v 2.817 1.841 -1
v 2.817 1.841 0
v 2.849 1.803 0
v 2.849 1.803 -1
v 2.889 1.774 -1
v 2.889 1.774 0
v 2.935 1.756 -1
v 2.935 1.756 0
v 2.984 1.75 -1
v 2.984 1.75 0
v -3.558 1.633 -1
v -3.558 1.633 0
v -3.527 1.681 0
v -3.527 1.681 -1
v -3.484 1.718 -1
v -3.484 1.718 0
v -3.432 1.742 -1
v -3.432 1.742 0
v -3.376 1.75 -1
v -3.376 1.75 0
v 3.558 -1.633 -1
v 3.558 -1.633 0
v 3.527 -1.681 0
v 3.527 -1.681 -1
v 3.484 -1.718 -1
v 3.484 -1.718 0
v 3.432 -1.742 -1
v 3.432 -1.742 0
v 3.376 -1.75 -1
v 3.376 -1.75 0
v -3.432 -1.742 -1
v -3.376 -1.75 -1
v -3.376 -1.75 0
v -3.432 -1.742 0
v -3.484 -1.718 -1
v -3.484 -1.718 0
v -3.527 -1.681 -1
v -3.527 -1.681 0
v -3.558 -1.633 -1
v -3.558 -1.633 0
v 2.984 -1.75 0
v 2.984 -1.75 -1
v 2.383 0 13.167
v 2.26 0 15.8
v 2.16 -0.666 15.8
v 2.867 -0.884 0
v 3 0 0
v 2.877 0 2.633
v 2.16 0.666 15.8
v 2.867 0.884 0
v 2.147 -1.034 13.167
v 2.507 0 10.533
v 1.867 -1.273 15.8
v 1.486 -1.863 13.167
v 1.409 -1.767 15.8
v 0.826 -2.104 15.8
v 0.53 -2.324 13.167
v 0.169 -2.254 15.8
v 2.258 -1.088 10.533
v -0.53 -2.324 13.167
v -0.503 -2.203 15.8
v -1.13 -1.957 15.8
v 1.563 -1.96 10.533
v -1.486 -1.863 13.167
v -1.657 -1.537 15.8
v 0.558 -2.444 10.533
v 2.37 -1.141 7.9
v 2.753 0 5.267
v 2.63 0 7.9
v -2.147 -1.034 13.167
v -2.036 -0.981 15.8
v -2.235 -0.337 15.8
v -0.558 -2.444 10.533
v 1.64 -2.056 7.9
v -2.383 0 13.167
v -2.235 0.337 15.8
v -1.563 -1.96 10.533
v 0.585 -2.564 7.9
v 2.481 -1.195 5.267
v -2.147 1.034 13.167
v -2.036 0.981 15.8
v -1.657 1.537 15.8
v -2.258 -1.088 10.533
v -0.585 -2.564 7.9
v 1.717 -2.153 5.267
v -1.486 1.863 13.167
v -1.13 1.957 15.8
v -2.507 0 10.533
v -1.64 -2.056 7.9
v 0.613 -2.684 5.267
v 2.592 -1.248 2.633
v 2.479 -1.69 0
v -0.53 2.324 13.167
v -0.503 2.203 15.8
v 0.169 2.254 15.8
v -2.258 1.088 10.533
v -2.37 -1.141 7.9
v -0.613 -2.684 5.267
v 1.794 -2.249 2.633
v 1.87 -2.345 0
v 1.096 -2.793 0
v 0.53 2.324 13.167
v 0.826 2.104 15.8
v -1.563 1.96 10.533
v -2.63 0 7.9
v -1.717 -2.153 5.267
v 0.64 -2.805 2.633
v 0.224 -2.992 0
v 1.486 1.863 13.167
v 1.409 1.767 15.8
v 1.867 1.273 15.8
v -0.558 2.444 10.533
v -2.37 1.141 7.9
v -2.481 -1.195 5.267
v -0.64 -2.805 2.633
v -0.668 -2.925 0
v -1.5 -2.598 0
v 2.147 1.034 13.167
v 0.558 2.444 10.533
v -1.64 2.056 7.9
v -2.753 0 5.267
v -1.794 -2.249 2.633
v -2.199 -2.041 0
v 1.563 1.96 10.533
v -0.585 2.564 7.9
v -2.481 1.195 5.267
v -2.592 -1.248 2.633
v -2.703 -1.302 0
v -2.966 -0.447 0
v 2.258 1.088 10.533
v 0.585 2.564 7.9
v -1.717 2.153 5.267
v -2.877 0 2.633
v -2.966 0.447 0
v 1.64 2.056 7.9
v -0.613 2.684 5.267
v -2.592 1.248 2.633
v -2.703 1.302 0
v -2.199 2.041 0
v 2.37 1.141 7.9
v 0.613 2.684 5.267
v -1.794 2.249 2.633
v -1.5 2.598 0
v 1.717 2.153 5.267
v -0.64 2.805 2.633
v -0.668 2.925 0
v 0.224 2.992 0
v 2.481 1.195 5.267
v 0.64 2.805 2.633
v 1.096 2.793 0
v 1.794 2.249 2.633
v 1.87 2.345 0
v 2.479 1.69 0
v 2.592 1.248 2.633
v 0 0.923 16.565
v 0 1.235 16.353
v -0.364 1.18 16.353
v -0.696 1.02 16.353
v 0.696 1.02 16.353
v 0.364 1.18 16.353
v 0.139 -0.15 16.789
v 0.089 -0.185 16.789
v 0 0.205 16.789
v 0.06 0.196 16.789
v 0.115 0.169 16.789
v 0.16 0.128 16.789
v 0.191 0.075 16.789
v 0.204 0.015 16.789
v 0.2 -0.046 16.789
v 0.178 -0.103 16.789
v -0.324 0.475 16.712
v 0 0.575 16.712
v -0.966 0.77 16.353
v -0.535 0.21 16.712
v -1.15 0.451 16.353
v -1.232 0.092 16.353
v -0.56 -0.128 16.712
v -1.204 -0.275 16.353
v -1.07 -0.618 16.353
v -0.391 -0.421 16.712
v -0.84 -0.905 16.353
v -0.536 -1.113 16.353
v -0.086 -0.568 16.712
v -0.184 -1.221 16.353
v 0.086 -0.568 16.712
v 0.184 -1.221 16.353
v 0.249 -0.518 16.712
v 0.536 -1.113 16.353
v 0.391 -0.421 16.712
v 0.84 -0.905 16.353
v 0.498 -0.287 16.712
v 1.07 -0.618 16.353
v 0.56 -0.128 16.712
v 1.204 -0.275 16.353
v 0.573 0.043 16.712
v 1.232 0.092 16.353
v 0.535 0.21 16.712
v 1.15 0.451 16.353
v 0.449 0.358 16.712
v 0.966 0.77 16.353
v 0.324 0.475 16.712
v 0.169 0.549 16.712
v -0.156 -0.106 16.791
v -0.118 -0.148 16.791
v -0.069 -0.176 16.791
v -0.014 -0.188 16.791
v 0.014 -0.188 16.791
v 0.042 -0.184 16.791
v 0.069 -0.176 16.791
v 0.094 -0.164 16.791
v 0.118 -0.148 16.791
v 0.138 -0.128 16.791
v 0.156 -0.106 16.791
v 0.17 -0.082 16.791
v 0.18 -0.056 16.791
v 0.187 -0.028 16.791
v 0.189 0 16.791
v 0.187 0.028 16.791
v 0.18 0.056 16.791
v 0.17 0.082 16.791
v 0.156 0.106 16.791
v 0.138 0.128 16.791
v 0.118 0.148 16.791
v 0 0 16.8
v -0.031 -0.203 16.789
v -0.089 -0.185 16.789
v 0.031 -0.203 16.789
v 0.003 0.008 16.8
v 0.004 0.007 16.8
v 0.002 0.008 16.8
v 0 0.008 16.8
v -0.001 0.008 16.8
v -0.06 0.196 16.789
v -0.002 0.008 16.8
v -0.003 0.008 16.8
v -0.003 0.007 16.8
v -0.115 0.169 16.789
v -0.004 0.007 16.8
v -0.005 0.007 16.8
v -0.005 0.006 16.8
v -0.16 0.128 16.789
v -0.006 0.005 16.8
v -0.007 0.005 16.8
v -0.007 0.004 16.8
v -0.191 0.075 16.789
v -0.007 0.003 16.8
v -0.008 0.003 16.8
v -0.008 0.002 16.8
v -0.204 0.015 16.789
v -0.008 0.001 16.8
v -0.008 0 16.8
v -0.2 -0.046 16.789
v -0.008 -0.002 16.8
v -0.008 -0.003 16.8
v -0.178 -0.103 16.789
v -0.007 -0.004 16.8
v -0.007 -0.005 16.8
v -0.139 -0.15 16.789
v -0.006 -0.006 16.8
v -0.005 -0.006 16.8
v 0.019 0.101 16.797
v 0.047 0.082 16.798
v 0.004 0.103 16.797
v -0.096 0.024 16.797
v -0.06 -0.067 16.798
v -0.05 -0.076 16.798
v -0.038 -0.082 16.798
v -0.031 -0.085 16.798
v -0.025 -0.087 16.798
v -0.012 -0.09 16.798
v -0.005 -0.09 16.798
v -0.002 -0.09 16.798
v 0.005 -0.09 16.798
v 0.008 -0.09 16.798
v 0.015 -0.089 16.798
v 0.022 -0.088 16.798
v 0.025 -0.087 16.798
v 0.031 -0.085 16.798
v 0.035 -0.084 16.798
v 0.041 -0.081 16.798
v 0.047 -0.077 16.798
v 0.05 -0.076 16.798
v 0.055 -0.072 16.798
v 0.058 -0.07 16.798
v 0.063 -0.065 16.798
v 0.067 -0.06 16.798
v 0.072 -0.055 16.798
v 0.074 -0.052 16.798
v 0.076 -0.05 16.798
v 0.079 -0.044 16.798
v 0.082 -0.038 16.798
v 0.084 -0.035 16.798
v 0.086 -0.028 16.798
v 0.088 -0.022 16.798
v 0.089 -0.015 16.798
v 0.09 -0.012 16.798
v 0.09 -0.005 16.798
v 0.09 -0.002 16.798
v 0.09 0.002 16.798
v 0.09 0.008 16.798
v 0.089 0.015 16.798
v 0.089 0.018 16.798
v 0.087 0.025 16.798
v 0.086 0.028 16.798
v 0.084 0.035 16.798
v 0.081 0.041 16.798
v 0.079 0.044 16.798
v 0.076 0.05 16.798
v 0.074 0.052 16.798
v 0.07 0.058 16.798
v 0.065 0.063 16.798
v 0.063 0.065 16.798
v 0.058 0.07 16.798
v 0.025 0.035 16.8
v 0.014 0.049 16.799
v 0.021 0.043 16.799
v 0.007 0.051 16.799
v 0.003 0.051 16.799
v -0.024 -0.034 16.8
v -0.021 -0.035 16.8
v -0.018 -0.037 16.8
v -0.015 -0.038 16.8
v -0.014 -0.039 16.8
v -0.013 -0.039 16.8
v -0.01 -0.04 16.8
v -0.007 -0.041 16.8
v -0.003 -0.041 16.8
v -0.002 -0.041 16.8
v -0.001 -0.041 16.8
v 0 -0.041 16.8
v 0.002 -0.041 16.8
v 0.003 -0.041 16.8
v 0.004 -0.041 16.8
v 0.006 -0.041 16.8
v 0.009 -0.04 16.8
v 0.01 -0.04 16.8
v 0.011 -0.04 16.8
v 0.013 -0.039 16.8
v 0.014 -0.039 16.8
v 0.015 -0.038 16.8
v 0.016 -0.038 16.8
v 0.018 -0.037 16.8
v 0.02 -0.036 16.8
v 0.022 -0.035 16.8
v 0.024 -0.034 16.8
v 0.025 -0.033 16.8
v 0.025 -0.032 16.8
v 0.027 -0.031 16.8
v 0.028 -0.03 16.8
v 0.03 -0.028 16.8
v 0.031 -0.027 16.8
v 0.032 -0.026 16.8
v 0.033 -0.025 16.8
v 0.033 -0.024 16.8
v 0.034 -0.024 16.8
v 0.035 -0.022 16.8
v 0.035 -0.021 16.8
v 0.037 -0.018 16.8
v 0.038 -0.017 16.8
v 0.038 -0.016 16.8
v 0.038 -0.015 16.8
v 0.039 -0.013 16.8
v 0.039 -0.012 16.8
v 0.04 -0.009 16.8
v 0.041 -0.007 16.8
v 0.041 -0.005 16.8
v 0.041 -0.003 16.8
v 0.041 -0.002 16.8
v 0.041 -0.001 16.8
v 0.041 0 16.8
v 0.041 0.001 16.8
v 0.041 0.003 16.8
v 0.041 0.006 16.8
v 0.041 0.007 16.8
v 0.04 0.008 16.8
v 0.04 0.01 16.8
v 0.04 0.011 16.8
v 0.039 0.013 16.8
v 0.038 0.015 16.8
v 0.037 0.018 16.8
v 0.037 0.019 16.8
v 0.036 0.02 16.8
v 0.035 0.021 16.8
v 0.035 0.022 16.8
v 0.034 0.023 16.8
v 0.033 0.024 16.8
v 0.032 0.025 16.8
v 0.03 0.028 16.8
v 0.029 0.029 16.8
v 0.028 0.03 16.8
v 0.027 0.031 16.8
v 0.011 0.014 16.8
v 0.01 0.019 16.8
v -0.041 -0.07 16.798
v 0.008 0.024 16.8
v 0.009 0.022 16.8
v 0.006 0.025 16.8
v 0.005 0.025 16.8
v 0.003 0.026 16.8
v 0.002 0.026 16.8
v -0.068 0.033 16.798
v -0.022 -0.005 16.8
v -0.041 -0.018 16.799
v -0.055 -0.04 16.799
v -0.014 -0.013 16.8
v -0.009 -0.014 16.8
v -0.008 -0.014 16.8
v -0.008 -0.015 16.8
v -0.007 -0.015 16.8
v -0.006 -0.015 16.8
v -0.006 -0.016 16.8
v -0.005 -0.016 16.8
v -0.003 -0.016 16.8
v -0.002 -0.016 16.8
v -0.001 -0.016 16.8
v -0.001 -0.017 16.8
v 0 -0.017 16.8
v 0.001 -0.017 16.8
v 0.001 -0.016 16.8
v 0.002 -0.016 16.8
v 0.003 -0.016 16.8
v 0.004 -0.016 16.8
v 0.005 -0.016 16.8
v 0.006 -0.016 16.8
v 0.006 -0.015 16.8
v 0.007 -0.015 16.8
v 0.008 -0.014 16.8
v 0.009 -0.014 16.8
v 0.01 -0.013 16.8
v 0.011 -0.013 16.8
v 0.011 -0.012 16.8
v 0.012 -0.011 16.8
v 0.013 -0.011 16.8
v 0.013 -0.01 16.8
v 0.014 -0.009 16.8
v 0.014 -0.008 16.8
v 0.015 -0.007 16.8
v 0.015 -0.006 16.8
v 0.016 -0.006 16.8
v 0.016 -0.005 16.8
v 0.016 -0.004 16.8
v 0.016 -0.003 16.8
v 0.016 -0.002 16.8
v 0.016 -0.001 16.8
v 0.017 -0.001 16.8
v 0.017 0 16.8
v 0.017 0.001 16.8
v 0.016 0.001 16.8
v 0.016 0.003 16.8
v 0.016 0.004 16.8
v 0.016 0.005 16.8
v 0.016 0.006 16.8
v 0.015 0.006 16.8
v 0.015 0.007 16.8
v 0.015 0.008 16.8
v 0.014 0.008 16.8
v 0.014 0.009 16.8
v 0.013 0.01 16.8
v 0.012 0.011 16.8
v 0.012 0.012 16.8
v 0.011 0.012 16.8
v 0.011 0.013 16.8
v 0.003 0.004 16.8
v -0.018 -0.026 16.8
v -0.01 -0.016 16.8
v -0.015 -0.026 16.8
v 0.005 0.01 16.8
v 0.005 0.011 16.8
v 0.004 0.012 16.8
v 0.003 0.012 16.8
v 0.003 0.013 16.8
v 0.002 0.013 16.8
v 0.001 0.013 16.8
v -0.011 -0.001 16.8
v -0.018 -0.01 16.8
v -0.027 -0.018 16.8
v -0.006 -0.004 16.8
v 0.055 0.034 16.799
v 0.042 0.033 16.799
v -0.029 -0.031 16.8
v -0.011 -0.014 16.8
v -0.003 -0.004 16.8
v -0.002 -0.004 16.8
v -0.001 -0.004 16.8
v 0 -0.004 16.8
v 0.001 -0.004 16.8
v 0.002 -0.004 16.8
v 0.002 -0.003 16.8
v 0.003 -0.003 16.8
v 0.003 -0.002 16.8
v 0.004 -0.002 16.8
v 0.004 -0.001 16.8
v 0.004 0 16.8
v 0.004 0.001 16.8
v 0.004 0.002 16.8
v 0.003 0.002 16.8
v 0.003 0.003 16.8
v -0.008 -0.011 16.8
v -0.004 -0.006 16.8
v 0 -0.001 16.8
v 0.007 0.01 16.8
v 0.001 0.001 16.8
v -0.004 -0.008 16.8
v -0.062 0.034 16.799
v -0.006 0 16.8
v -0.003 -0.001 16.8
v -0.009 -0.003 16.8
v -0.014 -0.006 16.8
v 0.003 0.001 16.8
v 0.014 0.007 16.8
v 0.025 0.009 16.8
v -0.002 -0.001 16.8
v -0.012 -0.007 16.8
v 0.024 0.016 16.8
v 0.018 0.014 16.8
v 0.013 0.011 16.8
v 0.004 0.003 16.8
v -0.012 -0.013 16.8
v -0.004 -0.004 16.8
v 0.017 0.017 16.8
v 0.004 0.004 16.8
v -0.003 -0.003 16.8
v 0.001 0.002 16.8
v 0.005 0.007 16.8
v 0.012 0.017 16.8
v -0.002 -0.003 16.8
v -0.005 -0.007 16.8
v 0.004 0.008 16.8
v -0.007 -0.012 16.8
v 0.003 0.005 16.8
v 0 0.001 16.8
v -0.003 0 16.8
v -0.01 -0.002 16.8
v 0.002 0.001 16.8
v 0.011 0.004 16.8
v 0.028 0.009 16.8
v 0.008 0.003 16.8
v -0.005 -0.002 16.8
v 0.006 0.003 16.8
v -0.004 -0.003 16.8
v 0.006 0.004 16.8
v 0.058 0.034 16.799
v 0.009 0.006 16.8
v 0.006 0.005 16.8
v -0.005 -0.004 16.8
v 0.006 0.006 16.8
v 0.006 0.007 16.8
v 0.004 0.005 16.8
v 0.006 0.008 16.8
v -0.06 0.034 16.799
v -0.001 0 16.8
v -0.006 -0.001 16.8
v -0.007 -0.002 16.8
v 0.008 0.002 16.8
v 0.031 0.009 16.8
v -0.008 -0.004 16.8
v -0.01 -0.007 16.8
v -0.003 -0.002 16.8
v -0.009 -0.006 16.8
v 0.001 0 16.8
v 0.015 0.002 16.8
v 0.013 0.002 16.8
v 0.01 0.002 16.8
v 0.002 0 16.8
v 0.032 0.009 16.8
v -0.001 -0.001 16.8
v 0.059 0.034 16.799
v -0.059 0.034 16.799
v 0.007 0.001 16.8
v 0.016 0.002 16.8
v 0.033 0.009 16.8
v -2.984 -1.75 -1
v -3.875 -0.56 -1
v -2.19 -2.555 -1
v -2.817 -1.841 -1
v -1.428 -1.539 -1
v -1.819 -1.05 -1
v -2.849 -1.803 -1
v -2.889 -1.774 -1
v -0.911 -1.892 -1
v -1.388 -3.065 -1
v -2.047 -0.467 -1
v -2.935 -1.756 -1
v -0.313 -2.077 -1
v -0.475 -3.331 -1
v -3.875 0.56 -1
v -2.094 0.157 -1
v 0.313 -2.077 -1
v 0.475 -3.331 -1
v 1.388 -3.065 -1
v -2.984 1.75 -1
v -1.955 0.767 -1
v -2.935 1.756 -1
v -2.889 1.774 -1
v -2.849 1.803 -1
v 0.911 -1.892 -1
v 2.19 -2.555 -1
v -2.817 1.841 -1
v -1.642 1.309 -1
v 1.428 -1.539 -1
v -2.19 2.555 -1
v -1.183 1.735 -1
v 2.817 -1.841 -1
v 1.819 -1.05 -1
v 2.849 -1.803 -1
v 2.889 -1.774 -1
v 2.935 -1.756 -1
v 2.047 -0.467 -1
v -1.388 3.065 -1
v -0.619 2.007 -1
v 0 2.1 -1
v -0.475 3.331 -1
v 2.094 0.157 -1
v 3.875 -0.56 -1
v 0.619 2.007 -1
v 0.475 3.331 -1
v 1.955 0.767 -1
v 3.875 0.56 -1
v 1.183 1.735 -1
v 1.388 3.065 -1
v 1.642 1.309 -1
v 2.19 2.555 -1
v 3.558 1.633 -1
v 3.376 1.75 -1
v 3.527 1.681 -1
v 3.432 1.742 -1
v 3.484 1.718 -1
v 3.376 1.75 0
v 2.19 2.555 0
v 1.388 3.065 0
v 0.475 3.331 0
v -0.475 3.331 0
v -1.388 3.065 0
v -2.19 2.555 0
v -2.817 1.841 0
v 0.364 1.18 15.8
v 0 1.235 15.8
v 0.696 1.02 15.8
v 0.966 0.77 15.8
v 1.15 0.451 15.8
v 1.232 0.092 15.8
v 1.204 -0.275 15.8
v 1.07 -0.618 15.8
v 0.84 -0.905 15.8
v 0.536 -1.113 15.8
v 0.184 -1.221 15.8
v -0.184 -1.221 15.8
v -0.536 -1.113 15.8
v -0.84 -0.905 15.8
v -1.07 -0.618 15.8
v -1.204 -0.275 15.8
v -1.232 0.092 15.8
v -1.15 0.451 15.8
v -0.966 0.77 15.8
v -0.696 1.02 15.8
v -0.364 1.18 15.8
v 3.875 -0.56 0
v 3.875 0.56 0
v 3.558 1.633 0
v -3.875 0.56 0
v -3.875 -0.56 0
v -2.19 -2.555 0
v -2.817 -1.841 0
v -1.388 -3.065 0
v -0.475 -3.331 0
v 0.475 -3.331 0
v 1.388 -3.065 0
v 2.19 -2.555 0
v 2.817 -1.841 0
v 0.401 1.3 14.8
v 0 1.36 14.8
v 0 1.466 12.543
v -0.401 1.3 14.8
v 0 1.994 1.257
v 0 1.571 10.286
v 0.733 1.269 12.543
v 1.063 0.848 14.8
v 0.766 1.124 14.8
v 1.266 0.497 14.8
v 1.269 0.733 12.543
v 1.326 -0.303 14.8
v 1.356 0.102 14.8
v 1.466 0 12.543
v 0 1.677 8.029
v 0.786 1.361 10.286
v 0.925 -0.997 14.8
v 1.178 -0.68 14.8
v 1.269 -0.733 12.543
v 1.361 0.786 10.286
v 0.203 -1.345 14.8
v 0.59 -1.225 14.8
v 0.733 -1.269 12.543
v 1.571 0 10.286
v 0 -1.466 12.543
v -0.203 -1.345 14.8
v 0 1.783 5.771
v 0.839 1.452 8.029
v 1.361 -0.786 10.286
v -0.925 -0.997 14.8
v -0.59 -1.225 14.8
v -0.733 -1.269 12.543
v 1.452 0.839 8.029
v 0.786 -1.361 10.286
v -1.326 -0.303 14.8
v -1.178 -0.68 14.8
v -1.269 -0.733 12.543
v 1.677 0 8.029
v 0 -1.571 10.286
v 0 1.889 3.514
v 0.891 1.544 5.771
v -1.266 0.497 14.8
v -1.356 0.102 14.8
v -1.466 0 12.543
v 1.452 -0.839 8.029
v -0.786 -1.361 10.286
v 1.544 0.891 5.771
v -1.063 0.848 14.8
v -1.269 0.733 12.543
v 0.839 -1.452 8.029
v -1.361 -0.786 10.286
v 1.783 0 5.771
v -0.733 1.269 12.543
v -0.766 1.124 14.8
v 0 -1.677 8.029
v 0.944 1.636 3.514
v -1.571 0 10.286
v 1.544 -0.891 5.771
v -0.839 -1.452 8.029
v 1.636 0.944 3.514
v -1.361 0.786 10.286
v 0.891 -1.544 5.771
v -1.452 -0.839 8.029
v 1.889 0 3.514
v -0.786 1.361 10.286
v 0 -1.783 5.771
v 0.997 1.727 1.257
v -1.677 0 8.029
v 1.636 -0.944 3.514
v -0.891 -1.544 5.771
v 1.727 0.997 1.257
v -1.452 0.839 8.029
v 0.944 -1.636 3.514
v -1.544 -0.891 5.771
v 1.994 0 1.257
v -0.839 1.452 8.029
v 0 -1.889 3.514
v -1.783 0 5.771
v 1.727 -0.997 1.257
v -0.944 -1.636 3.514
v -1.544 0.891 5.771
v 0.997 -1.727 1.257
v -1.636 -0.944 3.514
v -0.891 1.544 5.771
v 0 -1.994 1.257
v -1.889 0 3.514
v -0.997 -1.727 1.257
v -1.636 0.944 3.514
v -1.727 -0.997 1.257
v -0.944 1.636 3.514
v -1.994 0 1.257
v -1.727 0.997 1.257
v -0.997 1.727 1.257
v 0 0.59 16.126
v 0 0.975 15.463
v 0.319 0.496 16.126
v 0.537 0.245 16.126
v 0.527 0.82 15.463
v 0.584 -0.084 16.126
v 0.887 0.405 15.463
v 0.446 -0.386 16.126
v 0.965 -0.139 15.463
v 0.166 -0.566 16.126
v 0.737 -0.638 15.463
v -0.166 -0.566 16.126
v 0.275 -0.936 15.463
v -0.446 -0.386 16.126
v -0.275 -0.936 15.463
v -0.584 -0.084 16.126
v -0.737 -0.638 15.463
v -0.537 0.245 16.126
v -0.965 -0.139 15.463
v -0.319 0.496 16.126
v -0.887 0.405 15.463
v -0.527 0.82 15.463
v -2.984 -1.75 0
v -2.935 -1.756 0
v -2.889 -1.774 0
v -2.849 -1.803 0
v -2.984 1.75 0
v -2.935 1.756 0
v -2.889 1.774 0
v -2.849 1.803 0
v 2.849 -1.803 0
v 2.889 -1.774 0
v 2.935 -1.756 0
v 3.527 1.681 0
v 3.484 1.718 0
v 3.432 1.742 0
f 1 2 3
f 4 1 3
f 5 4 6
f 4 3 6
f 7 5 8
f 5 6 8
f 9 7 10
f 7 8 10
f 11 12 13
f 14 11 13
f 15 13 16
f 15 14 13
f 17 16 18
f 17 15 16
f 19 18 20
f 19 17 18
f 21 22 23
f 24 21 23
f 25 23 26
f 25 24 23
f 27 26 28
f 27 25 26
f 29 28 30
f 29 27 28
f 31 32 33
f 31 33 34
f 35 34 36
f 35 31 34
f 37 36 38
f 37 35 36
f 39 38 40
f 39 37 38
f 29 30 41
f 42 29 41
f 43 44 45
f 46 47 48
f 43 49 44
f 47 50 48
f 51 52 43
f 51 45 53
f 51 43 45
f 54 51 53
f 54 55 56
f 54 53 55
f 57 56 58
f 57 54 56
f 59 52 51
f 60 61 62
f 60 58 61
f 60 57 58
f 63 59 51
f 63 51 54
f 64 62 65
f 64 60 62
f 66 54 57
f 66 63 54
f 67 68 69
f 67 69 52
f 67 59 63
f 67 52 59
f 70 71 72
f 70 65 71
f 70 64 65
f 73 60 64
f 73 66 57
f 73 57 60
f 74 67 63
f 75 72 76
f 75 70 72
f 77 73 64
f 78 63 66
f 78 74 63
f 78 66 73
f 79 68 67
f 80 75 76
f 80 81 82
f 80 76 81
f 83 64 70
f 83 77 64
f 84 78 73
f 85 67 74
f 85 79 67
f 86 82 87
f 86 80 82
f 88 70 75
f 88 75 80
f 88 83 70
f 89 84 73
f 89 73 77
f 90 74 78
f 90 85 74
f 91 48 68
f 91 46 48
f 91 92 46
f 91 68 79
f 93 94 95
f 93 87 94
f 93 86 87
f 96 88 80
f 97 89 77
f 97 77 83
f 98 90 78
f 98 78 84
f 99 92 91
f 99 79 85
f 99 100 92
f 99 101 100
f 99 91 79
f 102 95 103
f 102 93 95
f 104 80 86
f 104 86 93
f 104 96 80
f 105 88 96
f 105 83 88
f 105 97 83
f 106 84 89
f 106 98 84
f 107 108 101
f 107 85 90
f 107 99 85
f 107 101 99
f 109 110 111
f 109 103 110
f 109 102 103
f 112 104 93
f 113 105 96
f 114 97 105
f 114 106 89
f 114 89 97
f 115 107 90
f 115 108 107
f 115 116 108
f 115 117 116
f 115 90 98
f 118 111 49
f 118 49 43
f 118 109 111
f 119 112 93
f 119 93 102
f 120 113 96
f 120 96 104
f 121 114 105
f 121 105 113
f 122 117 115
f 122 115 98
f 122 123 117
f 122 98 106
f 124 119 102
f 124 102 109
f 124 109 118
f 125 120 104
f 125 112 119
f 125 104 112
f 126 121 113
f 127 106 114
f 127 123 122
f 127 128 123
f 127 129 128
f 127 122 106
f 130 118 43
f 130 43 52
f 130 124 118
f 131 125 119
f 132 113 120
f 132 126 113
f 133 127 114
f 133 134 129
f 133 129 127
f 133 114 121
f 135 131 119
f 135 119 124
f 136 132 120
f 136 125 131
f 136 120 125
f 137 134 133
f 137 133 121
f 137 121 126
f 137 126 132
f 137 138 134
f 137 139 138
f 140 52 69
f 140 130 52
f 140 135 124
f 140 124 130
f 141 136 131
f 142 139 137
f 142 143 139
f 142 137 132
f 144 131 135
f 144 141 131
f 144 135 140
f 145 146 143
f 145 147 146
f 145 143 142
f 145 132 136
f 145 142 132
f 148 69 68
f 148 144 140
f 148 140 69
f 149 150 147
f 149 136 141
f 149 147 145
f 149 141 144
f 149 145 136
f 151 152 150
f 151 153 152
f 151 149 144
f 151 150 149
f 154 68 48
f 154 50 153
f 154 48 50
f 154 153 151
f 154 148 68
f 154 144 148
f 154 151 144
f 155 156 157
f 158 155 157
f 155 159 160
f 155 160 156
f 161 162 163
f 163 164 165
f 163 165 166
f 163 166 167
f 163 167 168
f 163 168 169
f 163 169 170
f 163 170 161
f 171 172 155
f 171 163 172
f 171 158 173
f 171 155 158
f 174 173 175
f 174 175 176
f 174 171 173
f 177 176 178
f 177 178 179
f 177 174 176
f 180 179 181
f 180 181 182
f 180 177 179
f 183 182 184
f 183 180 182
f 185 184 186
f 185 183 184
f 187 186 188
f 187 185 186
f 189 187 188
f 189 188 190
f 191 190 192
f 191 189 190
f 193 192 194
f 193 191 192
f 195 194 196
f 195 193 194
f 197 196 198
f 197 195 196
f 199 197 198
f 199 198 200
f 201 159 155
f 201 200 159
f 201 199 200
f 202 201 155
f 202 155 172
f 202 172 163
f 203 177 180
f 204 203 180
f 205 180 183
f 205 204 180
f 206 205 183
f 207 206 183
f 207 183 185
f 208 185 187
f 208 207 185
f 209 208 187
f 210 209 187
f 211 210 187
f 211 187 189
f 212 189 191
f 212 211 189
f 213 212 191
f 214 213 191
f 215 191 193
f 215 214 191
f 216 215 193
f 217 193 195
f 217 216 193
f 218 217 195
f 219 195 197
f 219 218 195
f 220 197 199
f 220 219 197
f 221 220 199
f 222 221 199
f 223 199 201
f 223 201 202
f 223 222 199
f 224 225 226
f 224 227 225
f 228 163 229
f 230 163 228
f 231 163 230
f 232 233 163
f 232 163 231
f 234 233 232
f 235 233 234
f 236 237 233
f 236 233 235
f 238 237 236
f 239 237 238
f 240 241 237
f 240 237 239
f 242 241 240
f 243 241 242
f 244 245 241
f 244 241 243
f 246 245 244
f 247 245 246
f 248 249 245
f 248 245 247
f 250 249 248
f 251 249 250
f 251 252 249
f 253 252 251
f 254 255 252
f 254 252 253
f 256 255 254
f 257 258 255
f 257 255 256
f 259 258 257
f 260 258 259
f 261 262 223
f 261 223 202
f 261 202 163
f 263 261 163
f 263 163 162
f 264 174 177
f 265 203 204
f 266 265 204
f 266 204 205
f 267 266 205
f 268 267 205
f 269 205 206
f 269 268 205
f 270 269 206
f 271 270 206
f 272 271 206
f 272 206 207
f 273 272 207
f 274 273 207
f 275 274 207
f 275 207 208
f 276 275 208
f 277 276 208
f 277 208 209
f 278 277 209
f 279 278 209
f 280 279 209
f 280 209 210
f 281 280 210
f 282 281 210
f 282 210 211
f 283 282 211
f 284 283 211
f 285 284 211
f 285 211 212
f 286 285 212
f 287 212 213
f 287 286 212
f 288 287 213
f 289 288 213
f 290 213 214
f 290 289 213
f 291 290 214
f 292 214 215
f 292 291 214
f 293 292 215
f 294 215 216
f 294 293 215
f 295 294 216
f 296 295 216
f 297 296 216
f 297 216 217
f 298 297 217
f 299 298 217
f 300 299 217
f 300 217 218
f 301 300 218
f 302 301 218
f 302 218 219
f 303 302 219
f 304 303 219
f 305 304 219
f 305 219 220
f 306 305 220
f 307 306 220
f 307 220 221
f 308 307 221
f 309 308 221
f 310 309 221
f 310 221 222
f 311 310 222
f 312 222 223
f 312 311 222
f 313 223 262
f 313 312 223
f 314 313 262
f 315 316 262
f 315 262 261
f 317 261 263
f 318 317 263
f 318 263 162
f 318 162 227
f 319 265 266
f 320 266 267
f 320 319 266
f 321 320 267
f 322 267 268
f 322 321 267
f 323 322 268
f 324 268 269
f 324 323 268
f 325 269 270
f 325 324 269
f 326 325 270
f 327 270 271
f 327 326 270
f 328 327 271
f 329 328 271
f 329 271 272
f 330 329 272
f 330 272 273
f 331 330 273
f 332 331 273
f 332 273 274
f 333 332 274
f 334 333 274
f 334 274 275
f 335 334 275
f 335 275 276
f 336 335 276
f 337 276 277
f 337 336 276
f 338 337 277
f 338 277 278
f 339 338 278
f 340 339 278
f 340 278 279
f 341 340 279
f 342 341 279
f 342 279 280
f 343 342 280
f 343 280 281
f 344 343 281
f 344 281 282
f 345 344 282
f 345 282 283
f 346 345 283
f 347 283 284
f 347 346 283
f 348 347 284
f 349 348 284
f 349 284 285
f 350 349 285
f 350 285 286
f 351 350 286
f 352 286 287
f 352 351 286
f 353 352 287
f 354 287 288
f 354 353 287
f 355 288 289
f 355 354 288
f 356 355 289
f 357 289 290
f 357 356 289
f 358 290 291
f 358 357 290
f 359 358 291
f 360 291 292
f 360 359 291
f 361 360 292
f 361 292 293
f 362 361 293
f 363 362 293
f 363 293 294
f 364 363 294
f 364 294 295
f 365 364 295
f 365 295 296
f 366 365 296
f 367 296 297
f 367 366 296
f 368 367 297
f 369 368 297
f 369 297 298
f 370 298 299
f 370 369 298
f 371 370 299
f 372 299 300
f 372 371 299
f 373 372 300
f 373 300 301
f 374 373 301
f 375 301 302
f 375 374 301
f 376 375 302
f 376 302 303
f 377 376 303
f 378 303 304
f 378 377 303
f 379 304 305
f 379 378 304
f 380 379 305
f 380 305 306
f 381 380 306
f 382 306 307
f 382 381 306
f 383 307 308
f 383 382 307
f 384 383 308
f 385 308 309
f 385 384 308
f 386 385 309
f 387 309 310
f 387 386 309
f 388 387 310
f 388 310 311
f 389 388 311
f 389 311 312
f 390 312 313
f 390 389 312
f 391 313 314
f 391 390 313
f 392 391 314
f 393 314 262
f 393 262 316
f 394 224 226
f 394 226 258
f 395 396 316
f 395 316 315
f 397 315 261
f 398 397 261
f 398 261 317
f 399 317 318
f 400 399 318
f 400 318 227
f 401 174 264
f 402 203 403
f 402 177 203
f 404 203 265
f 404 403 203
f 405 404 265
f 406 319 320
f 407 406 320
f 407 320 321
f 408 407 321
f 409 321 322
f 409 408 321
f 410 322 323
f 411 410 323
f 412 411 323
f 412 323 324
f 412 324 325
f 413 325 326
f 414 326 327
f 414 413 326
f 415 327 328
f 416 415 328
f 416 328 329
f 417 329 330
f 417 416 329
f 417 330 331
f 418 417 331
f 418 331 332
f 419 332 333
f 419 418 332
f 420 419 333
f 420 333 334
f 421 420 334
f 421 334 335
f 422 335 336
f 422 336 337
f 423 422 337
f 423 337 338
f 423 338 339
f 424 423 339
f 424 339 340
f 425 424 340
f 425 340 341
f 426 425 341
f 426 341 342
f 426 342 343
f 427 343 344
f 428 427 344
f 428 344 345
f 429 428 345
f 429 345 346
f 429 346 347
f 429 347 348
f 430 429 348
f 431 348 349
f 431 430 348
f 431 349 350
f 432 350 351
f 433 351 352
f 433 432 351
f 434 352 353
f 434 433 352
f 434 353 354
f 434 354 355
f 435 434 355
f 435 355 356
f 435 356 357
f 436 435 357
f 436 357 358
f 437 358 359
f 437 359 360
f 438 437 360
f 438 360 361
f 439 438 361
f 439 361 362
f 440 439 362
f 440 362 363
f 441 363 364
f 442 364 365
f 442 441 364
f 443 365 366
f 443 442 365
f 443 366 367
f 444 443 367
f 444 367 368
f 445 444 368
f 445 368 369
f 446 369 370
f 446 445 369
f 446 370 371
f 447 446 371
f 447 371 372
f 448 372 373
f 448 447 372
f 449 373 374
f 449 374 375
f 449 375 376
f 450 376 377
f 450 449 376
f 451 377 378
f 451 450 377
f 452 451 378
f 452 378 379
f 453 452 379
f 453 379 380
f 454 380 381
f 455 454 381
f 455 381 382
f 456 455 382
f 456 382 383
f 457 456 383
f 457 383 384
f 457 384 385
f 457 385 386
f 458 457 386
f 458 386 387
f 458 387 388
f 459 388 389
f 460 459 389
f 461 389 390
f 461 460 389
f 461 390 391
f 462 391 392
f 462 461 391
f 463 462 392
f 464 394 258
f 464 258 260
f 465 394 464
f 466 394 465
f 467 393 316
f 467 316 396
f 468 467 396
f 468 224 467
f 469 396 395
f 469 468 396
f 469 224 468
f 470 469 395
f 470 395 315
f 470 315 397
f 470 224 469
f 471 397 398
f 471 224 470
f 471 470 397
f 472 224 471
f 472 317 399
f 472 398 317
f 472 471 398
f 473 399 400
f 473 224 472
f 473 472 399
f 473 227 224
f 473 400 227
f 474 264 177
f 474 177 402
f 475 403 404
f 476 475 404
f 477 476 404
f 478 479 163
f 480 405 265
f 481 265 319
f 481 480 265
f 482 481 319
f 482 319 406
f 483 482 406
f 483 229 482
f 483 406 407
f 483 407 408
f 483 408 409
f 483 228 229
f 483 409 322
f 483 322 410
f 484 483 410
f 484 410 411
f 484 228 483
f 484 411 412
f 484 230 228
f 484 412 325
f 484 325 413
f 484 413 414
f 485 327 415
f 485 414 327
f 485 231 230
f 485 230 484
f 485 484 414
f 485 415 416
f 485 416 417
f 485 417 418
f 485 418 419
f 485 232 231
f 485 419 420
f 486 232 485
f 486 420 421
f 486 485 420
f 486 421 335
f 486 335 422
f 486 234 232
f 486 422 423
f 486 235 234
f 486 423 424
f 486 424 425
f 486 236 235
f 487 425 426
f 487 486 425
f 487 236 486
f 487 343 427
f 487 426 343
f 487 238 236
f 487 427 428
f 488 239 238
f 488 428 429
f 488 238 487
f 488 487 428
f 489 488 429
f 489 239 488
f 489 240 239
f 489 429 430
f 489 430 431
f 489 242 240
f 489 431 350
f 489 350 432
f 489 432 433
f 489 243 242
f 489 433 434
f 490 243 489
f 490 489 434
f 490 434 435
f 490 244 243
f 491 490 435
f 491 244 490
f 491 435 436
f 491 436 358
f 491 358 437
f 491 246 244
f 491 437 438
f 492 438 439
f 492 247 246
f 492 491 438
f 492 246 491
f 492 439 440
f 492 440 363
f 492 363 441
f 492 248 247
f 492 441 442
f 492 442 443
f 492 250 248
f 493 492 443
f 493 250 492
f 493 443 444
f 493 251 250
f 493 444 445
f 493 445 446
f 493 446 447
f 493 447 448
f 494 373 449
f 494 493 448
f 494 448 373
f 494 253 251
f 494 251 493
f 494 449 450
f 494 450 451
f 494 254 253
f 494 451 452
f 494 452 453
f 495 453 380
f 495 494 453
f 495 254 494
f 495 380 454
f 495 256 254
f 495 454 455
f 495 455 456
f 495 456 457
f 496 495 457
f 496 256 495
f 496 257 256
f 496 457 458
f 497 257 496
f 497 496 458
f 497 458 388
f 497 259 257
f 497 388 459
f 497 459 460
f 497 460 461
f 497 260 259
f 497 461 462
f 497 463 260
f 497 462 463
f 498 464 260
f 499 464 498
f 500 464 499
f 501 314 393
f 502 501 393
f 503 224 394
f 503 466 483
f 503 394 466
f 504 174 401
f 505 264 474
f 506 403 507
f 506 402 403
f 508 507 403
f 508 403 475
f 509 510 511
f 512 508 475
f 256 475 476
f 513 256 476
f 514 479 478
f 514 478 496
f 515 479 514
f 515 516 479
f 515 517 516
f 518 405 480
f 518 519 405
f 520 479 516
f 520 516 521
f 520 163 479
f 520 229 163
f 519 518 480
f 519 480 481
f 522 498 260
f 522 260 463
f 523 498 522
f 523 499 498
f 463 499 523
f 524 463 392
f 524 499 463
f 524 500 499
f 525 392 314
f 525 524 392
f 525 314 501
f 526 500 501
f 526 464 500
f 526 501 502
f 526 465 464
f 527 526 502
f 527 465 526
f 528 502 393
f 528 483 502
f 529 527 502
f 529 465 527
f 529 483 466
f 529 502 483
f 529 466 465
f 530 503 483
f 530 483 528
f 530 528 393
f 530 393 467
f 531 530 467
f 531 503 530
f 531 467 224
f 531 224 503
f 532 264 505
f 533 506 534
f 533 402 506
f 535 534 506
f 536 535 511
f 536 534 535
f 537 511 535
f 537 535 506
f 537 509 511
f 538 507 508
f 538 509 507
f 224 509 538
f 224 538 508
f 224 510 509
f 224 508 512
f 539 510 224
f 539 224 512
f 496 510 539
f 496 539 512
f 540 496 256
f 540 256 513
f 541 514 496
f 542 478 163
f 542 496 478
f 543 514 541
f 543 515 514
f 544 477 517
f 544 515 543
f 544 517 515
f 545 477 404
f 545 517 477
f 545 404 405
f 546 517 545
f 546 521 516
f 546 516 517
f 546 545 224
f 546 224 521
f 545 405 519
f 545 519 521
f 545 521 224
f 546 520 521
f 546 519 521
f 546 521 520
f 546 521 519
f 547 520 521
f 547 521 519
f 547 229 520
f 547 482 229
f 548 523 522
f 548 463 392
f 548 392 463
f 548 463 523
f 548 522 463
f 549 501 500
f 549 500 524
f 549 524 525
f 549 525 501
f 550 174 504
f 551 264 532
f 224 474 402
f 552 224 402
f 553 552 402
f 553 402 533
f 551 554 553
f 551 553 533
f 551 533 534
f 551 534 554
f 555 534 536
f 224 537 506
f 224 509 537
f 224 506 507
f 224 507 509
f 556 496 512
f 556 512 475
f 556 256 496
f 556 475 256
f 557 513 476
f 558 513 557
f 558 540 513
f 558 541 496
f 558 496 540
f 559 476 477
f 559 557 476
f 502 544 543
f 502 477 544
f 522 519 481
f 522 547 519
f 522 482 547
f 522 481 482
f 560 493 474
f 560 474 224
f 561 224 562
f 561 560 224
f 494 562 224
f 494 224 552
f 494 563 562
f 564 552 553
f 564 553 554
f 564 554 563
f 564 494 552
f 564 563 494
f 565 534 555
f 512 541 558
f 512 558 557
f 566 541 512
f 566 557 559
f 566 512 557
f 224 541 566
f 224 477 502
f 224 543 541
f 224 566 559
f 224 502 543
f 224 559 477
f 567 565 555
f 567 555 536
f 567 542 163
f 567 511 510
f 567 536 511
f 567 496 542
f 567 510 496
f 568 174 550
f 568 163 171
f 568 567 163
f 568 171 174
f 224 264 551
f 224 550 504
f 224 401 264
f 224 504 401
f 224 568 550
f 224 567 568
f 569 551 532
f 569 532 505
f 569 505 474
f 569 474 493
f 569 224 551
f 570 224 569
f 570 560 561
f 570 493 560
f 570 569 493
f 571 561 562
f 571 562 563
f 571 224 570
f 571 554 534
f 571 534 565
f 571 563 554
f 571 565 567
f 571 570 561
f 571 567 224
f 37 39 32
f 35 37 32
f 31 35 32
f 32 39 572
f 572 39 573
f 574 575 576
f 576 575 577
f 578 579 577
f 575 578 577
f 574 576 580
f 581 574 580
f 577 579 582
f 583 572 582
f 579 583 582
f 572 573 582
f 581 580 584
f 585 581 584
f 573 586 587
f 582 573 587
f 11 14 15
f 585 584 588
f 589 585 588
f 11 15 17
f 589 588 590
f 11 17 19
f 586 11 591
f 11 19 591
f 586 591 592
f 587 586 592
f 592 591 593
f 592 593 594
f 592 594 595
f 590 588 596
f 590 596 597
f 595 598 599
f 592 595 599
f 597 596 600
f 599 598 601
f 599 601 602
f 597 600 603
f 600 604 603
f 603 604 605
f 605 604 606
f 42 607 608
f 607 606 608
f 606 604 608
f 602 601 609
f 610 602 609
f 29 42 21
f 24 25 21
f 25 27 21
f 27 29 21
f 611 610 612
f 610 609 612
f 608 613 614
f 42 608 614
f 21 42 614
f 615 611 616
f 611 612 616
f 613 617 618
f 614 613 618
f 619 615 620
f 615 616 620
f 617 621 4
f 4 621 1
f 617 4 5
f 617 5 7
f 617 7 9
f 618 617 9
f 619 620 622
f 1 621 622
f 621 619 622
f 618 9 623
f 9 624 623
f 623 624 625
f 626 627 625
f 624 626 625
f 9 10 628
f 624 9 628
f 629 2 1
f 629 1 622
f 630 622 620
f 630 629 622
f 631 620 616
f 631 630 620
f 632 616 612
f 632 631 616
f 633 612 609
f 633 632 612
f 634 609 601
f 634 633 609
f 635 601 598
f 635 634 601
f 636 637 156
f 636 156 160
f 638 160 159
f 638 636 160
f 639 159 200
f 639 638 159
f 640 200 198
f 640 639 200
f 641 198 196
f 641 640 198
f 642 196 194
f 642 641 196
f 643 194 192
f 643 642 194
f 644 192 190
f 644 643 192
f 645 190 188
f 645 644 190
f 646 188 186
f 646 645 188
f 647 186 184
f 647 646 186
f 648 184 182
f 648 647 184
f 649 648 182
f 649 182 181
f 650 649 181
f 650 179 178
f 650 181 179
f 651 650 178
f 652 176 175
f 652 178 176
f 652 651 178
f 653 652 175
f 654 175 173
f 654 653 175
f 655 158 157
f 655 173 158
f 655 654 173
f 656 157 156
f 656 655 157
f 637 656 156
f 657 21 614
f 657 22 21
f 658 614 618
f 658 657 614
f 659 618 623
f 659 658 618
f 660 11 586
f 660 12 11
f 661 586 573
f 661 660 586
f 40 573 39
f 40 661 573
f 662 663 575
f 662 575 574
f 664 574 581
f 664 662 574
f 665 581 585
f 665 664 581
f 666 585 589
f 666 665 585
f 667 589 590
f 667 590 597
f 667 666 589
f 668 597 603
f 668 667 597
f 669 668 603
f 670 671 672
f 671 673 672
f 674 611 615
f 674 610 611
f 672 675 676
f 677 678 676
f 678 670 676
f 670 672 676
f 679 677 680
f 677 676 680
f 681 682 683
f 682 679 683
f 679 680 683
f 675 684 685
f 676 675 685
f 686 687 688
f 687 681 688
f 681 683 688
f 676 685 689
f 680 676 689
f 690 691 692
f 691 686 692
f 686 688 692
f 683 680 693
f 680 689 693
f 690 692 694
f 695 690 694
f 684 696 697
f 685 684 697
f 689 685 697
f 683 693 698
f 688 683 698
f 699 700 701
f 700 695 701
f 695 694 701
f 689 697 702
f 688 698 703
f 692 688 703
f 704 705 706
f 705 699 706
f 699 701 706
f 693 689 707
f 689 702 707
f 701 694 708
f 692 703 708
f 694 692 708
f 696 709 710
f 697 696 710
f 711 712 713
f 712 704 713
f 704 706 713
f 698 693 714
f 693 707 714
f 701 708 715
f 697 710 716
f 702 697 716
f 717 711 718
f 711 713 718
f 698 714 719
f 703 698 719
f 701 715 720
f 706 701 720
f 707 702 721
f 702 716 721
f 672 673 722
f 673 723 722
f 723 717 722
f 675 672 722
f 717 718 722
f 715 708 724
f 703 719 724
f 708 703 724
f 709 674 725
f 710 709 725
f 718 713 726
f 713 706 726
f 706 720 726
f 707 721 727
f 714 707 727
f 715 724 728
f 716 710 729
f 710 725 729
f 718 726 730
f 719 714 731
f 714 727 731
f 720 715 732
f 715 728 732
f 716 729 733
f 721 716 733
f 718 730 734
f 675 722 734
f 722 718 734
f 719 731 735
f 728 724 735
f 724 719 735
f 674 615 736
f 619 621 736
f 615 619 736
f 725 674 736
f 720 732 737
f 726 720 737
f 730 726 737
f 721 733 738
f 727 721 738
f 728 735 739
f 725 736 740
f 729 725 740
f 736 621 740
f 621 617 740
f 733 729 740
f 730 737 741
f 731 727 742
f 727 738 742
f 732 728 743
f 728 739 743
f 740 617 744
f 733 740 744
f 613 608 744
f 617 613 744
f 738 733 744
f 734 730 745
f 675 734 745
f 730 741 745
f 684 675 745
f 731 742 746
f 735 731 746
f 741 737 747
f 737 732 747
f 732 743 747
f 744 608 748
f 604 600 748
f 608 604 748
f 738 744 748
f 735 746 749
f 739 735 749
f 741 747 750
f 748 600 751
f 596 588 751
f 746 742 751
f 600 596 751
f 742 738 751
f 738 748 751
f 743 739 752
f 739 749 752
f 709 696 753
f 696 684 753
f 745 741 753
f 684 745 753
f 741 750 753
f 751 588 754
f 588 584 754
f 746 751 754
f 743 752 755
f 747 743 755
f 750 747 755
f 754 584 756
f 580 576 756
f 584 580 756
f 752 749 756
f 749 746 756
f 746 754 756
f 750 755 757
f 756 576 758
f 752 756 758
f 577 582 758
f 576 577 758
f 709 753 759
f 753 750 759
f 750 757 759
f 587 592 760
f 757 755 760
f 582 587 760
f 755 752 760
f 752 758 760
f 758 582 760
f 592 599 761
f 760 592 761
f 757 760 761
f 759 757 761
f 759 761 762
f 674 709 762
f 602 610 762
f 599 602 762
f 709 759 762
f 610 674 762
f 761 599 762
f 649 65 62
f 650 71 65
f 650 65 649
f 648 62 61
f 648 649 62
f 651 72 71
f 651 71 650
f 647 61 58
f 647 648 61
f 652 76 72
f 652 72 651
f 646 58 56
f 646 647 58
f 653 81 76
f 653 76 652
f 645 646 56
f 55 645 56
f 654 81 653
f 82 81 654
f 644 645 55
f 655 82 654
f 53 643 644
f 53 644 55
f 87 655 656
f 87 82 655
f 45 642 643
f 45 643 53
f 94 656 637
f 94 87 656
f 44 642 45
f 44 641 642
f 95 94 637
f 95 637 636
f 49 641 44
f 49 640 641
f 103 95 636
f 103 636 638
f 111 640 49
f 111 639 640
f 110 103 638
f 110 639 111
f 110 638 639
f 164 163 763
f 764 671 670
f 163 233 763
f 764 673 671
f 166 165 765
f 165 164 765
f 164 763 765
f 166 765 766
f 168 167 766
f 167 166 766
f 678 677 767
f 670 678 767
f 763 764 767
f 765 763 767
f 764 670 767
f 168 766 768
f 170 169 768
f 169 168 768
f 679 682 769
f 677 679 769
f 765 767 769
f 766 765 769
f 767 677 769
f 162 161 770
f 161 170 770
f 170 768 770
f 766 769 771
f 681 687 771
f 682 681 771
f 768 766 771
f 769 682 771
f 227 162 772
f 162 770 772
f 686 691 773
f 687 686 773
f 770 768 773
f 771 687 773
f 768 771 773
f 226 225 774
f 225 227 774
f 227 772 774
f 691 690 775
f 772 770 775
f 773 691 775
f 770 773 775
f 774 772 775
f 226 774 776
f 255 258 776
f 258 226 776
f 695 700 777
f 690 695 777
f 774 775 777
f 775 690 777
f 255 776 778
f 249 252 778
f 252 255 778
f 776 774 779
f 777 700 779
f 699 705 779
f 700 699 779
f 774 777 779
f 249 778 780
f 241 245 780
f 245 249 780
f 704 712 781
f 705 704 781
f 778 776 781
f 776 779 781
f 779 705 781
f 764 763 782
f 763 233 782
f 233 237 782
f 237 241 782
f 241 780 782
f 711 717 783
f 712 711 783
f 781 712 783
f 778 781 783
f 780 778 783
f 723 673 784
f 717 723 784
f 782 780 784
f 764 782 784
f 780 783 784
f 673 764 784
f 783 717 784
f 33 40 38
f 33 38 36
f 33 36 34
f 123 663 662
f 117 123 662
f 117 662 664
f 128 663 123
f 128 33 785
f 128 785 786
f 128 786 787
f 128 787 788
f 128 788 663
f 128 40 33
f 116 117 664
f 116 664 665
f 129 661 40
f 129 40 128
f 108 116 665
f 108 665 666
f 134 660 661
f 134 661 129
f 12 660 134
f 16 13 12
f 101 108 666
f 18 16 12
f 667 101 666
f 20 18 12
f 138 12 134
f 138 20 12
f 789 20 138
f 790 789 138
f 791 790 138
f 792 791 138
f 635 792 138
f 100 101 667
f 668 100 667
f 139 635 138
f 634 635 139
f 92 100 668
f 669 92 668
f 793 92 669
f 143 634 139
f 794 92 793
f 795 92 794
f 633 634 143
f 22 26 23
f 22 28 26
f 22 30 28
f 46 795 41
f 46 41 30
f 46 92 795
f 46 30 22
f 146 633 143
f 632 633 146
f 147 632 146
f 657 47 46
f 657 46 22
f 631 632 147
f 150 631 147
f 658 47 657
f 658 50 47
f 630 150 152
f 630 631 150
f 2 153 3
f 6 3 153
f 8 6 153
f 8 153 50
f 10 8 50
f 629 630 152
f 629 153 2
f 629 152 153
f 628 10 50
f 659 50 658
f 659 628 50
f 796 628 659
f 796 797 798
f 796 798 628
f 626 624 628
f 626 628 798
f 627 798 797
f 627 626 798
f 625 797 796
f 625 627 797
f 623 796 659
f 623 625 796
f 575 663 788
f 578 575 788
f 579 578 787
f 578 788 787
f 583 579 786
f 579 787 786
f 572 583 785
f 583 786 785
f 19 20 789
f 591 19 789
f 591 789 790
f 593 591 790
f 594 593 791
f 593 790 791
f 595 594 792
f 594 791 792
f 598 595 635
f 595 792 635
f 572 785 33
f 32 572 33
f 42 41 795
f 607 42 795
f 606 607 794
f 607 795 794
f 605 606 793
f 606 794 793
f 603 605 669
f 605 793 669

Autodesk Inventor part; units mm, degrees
ref_plane "YZ Plane" through (0, 0, 0) normal (1, 0, 0) x (0, 1, 0)
ref_plane "XZ Plane" through (0, 0, 0) normal (0, 1, 0) x (-1, 0, 0)
ref_plane "XY Plane" through (0, 0, 0) normal (0, 0, 1) x (1, 0, 0)
sketch "Sketch1" plane through (0, 0, 0) normal (0, 0, 1) x (1, 0, 0)
  circle A0 centre (0, 0) radius 3.365
  dimension "d0" = 6.73
sketch "Sketch2" plane through (0, 0, 0) normal (0, 1, 0) x (-1, 0, 0)
  line L0 (0, -3.16) -> (0, 18.96) projected
  line L1 (0, 0) -> (-2.26, 0)
  line L2 (0, 0) -> (-3, 0)
  line L3 (-3, 0) -> (-2.26, 15.8)
  line L4 (-2.26, 15.8) -> (0, 15.8)
  line L5 (0, 0) -> (0, 15.8)
  dimension "d3" = 2.26
  dimension "d5" = 2.26
  dimension "d6" = 3
  dimension "d7" = 15.8
revolve "Revolution1" add sketch "Sketch2" angle 360 about axis through (0, 0, -10) along (0, 0, 1)
sketch "Sketch3" plane through (0, 0, 0) normal (0, 0, -1) x (-1, 0, 0)
  circle A0 centre (0, 0) radius 3 projected
extrude "Extrusion1" add sketch "Sketch1" against normal blind 1
sketch "Sketch4" plane through (0, 0, 0) normal (0, 0, 1) x (1, 0, 0)
  circle A0 centre (0, 0) radius 3.915
  line L0 (0, 1.75) -> (3.5021, 1.75)
  line L1 (8.4729, 1.75) -> (8.4729, -1.75)
  line L2 (3.5021, -1.75) -> (0, -1.75)
  line L3 (0, -1.75) -> (0, 1.75)
  point P0 (0, 0)
  dimension "d11" = 7.83
  dimension "d12" = 3.5
extrude "Extrusion2" add sketch "Sketch4" against normal blind 1 contours A0 L2 L3 L0 picked at (1.305, 0)
fillet "Fillet1" radius 0.2 4 edges at (2.8741, 1.75, -0.5) (2.8741, -1.75, -0.5) (3.5021, 1.75, -0.5) (3.5021, -1.75, -0.5)
mirror "Mirror1" about plane through (0, 0, 0) normal (1, 0, 0) of "Extrusion2", "Fillet1"
sketch "Sketch5" plane through (0, 0, -1) normal (0, 0, -1) x (-1, 0, 0)
  arc A0 (-2.817, -1.8406) -> (2.817, -1.8406) centre (0, 0) ccw projected
  circle A1 centre (0, 0) radius 0.205
  dimension "d16" = 0.41
extrude "Extrusion3" [suppressed]
sketch "Sketch6" plane through (0, 0, 0) normal (1, 0, 0) x (0, 1, 0)
  line L0 (0, -10.88) -> (0, 58.28) projected
  line L1 (2.26, 15.8) -> (-2.26, 15.8) projected
  line L2 (0, 16.3531) -> (1.235, 16.3531)
  line L3 (1.235, 16.3531) -> (1.235, 15.8)
  line L4 (1.235, 15.8) -> (0, 15.8)
  line L5 (0, 15.8) -> (0, 16.3531)
  arc A0 (1.235, 16.3531) -> (0, 16.8) centre (0, 14.87) ccw
  line L6 (0, 16.8) -> (0, 16.3531)
  point P0 (0, 0)
  dimension "d19" = 1.235
revolve "Revolution2" add sketch "Sketch6" angle 360 about axis through (0, 0, -10) along (0, 0, 1)
sketch "Sketch9" plane through (0, 0, 0) normal (1, 0, 0) x (0, 1, 0)
  line L0 (0, -10.88) -> (0, 58.28) projected
  line L1 (2.26, 15.8) -> (-2.26, 15.8) projected
  line L2 (3, 0) -> (2.26, 15.8) projected
  line L3 (-1.6334, -1) -> (1.6334, -1) projected
  line L4 (0, 18.0112) -> (0, -1)
  line L5 (2.1, -1) -> (1.36, 14.8)
  line L6 (0.205, 18.0112) -> (0, 18.0112)
  line L7 (0, -1) -> (2.1, -1)
  line L8 (1.36, 14.8) -> (0.205, 14.8)
  line L9 (0.205, 14.8) -> (0.205, 18.0112)
  arc A0 (1.235, 16.3531) -> (-1.235, 16.3531) centre (0, 14.87) ccw projected
  line L10 (0.205, 16.7891) -> (1.36, 14.8)
  dimension "d37" = 2.1
  dimension "d38" = 1
  dimension "d40" = 0.205
revolve "Revolution3" cut sketch "Sketch9" angle 360 about axis through (0, 0, -10) along (0, 0, 1)
properties part number "Luer_Female"
